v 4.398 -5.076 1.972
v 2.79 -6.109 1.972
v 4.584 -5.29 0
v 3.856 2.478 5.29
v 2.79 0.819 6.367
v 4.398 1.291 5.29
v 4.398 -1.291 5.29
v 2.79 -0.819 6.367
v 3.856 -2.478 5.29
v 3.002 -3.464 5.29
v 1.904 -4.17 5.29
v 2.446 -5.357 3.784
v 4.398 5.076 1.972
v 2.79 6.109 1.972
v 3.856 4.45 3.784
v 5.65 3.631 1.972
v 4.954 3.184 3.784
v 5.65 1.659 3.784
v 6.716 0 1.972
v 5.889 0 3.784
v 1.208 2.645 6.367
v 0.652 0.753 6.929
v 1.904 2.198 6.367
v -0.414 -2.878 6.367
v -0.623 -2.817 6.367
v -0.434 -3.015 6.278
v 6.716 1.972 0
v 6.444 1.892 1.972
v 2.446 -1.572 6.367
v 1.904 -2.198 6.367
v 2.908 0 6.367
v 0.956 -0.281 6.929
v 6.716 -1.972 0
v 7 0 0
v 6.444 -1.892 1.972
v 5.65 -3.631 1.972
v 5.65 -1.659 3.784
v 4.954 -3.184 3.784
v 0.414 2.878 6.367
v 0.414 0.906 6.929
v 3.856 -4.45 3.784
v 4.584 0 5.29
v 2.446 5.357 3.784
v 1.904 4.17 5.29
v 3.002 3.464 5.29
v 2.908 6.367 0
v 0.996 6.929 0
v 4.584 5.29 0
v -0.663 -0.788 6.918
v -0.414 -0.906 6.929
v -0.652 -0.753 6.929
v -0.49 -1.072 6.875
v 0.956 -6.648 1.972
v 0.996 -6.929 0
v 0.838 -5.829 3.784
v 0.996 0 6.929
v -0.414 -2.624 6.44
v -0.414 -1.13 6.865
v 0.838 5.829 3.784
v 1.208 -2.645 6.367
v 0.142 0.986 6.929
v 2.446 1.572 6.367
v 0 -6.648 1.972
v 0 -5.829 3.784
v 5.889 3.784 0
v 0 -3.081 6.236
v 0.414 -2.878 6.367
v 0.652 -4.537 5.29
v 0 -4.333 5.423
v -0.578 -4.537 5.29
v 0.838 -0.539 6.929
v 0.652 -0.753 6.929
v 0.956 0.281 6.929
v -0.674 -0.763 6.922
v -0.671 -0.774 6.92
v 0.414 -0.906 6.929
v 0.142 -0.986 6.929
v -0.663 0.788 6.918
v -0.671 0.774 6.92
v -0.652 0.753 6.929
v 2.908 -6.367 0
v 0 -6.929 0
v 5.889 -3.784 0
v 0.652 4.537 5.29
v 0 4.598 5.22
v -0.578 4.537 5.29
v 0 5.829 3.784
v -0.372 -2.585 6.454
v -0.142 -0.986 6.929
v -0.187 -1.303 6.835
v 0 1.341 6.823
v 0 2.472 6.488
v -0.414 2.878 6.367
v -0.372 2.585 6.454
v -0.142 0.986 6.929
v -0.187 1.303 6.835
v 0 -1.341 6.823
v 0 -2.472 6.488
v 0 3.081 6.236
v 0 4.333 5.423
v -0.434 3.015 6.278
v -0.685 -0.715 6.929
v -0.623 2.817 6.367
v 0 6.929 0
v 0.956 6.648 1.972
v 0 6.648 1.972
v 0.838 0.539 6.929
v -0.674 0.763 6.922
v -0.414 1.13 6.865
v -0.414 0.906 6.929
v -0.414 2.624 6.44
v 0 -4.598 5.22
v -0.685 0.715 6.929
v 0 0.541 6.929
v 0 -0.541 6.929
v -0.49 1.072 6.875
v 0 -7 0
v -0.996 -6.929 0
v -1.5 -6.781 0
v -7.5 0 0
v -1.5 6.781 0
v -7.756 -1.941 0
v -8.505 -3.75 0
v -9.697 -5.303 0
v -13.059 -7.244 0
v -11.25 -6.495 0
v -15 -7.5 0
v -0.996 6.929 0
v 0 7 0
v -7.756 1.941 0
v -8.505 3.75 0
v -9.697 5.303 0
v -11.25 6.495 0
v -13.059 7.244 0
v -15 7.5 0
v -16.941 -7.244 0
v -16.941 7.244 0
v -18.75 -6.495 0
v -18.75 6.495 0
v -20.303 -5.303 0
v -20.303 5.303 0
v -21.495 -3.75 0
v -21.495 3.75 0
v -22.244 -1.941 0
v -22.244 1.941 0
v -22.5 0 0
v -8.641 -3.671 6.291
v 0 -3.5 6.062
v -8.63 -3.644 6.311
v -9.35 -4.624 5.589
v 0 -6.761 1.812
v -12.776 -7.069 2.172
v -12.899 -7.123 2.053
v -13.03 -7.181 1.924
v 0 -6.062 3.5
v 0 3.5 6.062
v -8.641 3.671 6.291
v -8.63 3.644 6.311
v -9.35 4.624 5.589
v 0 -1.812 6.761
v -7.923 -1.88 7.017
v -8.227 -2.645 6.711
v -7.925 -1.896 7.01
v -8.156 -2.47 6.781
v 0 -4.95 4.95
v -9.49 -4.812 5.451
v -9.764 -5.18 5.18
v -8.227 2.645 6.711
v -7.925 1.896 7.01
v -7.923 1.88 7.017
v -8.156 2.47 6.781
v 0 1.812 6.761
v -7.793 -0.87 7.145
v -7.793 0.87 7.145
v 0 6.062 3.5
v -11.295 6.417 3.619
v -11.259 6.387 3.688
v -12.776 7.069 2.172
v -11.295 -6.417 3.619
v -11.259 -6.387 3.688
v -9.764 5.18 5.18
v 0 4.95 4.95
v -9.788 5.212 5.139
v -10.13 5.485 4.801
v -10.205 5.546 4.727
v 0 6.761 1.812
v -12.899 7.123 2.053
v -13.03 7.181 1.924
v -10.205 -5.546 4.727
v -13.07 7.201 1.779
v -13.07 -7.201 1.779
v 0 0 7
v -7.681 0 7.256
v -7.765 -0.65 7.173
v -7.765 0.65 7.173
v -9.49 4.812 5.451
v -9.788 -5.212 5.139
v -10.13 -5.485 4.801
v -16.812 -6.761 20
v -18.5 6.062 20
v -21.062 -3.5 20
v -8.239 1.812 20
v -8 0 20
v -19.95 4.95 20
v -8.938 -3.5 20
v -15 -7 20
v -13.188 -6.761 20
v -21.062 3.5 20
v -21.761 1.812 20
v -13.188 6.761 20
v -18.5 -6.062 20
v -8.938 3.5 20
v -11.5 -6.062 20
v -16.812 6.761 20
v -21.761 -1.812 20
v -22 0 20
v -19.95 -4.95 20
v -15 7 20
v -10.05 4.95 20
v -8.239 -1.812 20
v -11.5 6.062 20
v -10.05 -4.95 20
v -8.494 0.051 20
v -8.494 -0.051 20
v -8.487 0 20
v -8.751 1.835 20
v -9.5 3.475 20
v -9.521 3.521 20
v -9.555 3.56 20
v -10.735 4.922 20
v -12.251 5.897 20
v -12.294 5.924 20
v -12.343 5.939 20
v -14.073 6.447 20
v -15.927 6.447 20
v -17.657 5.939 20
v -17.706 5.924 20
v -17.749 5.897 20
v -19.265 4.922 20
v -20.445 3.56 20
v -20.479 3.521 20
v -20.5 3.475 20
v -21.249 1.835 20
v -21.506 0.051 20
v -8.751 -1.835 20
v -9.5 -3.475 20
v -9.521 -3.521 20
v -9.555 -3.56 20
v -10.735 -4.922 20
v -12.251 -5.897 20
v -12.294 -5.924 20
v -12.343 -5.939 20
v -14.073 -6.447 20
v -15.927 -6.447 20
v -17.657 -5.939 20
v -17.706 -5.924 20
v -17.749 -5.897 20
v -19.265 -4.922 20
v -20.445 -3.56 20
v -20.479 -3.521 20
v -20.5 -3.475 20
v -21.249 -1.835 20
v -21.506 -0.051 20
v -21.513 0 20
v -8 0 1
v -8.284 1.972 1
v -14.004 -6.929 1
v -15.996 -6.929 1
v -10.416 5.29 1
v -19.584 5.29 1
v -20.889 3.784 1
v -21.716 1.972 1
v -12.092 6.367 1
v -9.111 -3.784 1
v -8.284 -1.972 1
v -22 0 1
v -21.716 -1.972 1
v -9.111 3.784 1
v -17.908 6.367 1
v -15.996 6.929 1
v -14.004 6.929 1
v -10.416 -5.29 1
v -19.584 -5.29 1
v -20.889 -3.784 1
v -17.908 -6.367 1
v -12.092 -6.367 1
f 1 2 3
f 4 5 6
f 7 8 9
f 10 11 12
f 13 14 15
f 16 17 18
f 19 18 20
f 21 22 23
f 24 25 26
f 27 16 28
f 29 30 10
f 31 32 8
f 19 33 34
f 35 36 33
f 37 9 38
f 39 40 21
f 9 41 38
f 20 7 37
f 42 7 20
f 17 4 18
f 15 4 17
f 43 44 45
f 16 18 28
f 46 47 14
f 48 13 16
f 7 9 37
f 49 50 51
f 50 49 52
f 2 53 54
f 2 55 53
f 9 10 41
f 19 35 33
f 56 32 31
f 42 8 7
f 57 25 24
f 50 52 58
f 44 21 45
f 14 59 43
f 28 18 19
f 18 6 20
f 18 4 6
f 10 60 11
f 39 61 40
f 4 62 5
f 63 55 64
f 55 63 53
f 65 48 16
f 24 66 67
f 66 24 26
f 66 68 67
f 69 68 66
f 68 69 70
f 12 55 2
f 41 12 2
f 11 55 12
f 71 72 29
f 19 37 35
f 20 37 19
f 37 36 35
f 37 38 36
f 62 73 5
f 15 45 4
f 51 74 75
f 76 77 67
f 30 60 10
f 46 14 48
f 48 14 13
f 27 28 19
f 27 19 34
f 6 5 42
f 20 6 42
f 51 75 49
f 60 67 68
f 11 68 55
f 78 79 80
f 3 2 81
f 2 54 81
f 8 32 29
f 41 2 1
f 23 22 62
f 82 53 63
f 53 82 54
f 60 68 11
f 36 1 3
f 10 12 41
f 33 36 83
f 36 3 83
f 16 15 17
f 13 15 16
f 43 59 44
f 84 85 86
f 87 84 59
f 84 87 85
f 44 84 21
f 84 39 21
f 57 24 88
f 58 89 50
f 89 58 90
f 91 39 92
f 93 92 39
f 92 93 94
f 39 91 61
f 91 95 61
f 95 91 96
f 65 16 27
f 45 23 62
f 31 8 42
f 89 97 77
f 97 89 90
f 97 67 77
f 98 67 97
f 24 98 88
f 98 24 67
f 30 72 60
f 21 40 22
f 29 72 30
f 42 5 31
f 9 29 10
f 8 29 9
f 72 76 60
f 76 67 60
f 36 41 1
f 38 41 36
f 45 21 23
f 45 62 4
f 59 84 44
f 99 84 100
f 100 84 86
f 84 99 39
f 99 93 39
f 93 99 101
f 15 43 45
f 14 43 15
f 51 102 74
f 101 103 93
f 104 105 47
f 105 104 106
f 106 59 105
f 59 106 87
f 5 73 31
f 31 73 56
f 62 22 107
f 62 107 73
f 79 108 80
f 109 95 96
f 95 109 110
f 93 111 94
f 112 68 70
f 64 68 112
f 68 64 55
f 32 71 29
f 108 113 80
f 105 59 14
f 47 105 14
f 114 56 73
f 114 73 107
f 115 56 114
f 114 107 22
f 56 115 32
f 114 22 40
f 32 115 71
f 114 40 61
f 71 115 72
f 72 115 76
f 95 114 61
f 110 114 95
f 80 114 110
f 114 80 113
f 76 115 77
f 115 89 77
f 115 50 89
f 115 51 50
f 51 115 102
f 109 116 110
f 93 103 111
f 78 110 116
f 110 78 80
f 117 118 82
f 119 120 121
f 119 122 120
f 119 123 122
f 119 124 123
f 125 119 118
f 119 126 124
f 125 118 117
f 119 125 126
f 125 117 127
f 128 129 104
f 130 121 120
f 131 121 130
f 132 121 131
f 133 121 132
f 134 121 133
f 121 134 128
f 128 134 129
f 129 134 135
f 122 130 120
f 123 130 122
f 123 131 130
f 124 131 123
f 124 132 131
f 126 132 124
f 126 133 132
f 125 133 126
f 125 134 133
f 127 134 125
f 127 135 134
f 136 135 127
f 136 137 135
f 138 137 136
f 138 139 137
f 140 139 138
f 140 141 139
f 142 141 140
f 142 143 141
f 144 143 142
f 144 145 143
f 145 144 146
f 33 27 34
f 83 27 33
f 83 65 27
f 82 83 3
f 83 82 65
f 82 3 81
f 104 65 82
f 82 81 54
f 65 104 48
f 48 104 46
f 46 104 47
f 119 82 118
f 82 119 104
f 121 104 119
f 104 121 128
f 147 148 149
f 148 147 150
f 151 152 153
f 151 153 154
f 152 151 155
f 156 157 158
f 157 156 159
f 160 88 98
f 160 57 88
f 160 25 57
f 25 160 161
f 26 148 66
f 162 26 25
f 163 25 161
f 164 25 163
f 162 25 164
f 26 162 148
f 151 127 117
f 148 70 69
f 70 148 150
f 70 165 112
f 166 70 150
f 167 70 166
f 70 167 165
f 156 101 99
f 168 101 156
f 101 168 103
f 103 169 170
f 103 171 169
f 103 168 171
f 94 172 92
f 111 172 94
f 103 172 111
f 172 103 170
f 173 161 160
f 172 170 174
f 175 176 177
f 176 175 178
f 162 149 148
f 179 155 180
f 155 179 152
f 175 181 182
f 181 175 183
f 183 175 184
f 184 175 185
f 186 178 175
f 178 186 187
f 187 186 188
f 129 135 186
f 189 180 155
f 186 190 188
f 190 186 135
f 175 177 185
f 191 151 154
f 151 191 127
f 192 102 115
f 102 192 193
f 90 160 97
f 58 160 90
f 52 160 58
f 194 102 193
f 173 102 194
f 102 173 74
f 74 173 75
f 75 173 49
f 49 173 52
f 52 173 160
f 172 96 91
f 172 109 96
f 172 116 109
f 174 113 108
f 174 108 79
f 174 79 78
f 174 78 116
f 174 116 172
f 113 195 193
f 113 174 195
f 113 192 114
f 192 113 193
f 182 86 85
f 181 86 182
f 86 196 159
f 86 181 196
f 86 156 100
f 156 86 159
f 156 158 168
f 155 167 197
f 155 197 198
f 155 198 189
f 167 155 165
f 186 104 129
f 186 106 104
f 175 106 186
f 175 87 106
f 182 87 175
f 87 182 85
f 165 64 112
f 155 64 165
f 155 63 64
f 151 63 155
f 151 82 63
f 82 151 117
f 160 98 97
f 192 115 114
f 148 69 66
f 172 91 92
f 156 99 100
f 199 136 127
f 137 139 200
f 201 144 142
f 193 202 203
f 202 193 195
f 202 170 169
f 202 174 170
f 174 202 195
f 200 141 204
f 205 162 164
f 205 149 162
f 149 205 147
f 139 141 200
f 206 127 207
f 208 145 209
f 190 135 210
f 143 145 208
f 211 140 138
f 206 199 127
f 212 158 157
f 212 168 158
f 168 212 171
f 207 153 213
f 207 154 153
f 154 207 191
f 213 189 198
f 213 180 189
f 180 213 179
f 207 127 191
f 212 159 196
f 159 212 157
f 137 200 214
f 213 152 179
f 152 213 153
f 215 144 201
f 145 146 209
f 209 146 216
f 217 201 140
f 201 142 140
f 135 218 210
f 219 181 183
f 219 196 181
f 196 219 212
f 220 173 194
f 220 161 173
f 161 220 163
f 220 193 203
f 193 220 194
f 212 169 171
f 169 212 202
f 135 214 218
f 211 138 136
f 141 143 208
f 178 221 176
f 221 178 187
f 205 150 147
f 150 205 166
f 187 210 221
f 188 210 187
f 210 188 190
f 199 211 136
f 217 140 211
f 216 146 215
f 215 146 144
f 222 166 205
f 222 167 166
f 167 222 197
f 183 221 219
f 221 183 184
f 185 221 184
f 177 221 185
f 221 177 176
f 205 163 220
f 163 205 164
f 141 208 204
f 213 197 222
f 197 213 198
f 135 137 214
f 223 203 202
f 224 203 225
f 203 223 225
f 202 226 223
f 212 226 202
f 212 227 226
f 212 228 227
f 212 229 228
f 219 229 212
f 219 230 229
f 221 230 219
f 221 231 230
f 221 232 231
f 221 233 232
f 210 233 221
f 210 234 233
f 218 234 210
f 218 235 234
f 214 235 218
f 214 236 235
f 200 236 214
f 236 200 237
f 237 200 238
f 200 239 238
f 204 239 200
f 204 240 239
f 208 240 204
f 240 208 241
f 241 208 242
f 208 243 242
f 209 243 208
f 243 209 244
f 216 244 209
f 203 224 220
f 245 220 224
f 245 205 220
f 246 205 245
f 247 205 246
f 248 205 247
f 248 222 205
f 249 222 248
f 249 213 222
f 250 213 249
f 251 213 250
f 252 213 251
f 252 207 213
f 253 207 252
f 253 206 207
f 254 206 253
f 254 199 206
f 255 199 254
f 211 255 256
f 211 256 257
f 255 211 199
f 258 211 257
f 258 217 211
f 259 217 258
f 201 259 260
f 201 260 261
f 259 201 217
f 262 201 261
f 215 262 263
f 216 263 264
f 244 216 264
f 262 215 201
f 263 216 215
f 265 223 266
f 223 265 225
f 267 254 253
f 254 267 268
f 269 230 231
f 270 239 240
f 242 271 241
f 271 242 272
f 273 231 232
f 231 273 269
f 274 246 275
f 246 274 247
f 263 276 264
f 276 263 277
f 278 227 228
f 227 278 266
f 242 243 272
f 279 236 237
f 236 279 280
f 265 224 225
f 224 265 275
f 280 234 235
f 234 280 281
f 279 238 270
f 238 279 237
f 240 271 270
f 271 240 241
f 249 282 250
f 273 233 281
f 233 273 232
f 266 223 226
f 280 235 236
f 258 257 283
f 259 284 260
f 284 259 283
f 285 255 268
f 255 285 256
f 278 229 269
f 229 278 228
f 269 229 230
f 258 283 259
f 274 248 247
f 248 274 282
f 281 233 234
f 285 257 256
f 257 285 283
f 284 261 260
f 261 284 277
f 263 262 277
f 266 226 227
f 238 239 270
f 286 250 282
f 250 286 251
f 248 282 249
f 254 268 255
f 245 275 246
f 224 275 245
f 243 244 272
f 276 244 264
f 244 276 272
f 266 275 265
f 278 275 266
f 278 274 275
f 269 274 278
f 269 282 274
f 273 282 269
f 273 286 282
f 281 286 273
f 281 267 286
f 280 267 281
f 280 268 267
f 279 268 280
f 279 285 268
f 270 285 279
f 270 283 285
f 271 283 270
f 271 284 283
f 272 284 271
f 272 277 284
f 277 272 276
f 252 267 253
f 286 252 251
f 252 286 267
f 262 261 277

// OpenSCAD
difference() {

union() {
    intersection() {
sphere(d=14);
translate([6,0,7.5])
cube(15,center=true);
}

difference() {
translate([-15,0,0])
rotate([0,90,0])
cylinder(d1=15, d2=14, h=15);

translate([-10,0,-4])
cube([25,21,8], center=true);
}


translate([-15,0,0])

cylinder(d1=15, d2=14, h=20);

}


   translate([-15,0,1]) 
   cylinder(d1=14,d2=13,h=19.5);
}
